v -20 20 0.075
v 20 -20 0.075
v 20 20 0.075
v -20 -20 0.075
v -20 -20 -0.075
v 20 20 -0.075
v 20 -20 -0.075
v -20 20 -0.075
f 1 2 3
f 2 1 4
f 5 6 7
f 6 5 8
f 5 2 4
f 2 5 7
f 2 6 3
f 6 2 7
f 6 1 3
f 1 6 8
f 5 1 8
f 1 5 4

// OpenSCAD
first_layer_hight = 0.15;   // first layer hight in mm
size = 40; //side length of the layer in mm

cube([size,size,first_layer_hight], center=true);
